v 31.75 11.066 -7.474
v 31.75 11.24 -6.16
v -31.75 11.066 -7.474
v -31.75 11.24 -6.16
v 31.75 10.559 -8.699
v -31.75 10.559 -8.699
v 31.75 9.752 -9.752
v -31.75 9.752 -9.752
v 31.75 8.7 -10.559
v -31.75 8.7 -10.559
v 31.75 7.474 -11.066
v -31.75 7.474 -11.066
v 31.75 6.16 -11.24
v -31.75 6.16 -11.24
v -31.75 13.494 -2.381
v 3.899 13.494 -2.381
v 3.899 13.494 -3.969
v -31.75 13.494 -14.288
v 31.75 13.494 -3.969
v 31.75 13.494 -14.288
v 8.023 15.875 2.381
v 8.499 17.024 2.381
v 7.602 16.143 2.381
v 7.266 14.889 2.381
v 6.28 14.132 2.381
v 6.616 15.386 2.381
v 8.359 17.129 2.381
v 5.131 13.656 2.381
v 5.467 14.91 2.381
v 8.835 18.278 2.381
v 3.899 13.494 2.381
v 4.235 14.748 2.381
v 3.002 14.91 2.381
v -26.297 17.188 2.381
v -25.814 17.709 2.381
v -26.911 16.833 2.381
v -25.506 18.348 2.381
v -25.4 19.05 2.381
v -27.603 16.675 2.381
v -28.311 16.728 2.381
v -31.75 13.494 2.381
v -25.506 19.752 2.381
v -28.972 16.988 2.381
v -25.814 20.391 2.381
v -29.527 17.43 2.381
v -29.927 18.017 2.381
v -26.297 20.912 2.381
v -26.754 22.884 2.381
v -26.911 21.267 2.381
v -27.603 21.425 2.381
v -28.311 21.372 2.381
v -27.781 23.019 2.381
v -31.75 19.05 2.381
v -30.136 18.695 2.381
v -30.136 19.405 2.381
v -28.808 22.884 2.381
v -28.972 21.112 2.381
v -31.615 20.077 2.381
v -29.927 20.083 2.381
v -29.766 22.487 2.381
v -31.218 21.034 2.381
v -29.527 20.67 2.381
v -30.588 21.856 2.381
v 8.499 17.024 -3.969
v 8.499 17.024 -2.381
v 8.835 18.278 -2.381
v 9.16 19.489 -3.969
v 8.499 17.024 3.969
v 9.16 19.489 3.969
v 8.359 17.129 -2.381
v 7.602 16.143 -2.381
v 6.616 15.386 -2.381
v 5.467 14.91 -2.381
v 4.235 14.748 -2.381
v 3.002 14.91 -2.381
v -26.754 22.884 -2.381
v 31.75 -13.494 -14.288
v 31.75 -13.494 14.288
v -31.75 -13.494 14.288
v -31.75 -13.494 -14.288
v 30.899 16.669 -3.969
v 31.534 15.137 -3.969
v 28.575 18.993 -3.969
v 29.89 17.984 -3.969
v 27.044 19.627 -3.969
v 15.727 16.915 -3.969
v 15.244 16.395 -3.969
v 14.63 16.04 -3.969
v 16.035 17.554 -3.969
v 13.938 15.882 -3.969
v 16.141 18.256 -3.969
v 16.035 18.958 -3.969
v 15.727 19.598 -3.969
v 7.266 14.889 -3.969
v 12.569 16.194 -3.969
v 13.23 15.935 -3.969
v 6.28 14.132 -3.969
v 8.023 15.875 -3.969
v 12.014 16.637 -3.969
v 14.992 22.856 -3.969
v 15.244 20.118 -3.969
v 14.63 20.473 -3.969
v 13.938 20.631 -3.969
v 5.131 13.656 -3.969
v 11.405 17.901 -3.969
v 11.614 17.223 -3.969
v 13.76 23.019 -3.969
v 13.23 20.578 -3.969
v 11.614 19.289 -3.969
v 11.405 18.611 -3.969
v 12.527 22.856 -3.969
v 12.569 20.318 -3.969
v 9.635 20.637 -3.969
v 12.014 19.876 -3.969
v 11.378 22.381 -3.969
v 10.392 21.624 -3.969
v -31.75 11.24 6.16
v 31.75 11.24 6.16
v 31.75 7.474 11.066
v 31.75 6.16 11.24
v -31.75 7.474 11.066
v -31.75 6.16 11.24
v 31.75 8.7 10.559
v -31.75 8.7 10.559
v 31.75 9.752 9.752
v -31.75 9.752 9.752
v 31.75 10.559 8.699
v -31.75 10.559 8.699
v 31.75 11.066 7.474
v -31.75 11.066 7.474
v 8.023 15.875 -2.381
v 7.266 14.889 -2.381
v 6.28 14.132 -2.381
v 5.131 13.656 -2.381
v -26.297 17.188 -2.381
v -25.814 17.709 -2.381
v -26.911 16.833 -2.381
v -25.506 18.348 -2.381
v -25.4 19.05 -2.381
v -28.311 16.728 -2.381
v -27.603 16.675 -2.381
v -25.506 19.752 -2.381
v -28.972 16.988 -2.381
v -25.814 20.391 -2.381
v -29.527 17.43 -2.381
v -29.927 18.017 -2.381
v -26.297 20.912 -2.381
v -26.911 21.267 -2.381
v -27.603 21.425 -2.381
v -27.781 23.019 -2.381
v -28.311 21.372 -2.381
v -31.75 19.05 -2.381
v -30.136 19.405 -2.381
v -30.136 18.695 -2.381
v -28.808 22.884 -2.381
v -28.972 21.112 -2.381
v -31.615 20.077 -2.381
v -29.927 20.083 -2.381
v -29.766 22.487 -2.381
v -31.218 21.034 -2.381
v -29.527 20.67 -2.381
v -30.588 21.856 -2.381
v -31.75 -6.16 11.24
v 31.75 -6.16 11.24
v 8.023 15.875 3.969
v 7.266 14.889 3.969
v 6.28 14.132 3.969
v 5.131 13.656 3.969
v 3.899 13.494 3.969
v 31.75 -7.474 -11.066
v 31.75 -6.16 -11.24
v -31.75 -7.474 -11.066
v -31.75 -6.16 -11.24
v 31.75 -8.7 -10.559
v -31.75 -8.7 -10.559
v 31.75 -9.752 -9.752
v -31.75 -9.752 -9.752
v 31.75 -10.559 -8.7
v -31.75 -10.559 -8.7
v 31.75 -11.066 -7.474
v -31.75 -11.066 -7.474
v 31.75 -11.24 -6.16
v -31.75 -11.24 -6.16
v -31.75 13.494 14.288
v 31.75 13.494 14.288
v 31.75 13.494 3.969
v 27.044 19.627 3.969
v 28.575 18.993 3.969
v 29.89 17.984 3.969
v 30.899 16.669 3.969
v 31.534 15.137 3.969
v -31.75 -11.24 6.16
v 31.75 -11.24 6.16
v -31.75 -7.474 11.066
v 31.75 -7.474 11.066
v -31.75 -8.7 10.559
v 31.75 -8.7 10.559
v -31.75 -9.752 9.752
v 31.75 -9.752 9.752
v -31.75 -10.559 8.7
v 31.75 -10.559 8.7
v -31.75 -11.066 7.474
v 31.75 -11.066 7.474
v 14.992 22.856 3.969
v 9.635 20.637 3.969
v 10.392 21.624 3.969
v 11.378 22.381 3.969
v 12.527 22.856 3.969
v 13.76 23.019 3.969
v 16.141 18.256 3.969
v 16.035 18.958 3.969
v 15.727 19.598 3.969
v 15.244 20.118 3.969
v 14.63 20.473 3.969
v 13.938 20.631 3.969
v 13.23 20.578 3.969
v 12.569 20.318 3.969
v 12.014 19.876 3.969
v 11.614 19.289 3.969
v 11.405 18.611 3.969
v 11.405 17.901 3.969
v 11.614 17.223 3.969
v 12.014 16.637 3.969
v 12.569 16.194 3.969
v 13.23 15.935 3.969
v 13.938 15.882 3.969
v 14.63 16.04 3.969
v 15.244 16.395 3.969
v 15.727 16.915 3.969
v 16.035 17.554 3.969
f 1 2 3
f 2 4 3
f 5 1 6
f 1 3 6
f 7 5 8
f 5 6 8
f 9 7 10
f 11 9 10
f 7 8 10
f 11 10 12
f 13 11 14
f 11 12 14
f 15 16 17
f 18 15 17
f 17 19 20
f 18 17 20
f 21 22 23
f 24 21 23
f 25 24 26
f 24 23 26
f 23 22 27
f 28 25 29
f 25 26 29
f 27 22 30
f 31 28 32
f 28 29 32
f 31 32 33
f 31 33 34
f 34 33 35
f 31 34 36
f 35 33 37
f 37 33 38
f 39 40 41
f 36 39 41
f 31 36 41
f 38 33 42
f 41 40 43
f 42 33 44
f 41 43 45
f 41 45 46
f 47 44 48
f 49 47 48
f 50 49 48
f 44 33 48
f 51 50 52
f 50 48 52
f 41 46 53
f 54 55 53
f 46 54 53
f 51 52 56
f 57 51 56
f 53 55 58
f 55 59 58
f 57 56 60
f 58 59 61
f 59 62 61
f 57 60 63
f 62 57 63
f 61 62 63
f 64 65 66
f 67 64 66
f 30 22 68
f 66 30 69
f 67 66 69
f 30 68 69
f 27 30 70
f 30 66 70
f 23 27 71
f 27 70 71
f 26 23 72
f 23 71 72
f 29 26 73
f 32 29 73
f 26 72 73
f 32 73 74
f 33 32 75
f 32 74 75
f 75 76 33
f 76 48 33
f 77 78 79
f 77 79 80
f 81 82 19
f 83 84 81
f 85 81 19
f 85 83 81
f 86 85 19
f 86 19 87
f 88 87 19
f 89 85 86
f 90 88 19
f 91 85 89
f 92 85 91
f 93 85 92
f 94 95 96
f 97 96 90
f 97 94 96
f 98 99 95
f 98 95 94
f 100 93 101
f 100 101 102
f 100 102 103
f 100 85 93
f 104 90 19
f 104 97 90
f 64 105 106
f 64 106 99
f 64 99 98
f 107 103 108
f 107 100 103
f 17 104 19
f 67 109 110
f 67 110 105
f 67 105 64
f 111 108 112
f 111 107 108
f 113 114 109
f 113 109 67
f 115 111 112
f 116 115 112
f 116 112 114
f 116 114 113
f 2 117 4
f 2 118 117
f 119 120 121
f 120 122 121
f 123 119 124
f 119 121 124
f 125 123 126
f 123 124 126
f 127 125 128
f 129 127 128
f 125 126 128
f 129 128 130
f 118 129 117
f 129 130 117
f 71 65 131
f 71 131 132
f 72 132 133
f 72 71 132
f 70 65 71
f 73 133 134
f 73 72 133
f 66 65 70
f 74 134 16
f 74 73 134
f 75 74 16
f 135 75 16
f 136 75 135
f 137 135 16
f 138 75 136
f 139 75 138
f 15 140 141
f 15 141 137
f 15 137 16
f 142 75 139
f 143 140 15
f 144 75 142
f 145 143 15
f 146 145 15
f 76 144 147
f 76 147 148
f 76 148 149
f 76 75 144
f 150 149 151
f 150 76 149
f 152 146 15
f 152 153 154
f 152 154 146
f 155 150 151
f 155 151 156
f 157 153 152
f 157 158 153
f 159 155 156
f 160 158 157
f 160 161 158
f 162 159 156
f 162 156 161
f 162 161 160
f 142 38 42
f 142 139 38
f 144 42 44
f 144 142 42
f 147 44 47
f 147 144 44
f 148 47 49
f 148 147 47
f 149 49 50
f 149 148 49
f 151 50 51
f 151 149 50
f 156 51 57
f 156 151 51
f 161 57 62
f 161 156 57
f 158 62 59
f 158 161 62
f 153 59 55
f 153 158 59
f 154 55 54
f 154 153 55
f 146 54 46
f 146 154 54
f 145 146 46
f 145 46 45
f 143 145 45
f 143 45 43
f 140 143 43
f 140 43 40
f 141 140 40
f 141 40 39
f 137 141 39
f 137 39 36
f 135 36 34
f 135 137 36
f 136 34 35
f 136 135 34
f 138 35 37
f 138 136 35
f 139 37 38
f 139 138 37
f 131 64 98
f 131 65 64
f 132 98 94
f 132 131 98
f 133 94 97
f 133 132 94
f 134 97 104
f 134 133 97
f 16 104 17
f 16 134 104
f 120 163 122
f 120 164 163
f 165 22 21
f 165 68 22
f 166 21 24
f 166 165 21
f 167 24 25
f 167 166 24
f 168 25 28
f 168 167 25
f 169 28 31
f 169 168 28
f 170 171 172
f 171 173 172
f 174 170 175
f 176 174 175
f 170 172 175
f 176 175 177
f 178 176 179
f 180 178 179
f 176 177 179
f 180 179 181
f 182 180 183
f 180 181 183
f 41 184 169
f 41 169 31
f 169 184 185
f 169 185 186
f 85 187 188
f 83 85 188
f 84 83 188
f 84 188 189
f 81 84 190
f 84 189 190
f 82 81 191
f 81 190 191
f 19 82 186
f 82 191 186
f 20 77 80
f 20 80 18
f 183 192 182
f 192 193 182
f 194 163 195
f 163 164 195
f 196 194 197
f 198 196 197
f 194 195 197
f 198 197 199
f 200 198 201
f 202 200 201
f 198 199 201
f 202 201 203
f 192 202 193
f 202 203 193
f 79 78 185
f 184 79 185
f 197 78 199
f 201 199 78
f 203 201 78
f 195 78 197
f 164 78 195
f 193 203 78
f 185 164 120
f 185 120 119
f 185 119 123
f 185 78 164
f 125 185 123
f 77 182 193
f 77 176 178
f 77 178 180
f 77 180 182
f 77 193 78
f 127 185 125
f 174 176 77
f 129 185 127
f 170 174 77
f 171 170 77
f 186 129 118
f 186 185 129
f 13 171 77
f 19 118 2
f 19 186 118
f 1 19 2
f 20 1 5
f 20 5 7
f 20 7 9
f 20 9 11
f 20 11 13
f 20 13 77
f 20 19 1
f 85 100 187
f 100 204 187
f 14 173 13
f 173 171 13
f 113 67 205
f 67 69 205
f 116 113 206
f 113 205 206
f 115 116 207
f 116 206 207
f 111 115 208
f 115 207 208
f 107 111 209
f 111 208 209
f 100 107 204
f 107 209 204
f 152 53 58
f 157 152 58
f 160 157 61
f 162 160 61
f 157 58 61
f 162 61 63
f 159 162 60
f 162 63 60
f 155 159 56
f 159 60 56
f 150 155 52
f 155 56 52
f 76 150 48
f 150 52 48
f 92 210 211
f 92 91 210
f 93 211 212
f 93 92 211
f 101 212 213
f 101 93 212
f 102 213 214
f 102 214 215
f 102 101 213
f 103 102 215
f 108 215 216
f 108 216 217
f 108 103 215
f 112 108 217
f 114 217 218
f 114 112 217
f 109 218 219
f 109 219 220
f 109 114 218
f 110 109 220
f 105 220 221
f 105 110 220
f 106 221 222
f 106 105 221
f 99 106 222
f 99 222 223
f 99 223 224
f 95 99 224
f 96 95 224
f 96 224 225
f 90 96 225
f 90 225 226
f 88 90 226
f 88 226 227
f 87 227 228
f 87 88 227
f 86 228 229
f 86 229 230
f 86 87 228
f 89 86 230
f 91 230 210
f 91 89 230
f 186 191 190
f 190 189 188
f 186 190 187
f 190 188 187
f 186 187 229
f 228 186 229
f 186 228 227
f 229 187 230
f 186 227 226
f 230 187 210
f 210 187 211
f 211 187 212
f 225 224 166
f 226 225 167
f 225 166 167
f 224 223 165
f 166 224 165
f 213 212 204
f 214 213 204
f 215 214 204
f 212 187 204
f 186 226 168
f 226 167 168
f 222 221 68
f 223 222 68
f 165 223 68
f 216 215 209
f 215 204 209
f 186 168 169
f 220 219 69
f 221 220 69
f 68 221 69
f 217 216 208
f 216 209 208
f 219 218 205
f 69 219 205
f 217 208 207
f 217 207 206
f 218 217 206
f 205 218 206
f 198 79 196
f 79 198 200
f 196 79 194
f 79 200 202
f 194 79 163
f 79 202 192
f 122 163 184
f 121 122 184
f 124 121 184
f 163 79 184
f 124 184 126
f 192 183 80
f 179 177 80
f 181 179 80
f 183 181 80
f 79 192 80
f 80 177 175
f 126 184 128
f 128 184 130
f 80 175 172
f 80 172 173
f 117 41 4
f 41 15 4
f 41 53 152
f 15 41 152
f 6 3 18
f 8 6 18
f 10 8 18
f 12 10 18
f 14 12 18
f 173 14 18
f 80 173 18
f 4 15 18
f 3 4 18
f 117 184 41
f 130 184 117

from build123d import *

# Parameters (mm, degrees)
SKETCH1_W           = 28.575
SKETCH1_H           = 26.9875
SKETCH1_W_2         = 22.479
SKETCH1_H_2         = 22.479
BOSS_EXTRUDE1_DEPTH = 31.75
FILLET1_R           = 5.08
SKETCH2_R           = 2.38125
BOSS_EXTRUDE2_DEPTH = 3.96875
SKETCH3_R           = 2.38125
BOSS_EXTRUDE3_DEPTH = 2.38125
FILLET2_R           = 4.7625
FILLET3_R           = 4.7625


with BuildPart() as part:
    # Sketch1 → Boss-Extrude1 (new body, symmetric)
    with BuildSketch(Plane(origin=(0, 0, 0), x_dir=(0, 0, -1), z_dir=(1, 0, 0))):
        Rectangle(SKETCH1_W, SKETCH1_H)
        Rectangle(SKETCH1_W_2, SKETCH1_H_2, mode=Mode.SUBTRACT)
    extrude(amount=BOSS_EXTRUDE1_DEPTH, both=True)

    # Fillet1
    fillet1_edges = [part.edges().sort_by_distance(p)[0] for p in [
        (0, -11.2395, -11.2395),
        (0, 11.2395, -11.2395),
        (0, 11.2395, 11.2395),
        (0, -11.2395, 11.2395),
    ]]
    fillet(fillet1_edges, radius=FILLET1_R)

    # Sketch2 → Boss-Extrude2 (add, symmetric)
    with BuildSketch(Plane.XY):
        with BuildLine():
            Line((7.553126188, 13.49375), (9.159515278, 19.488875702))
            ThreePointArc((9.159515278, 19.488875702), (11.378487026, 22.380695986), (14.992362728, 22.856471748))
            Line((14.992362728, 22.856471748), (27.043500936, 19.627378997))
            ThreePointArc((27.043500936, 19.627378997), (30.437793711, 17.359385074), (31.75, 13.49375))
            Line((31.75, 13.49375), (7.553126188, 13.49375))
        make_face()
        with Locations((13.759737026, 18.25625)):
            Circle(SKETCH2_R, mode=Mode.SUBTRACT)
    extrude(amount=BOSS_EXTRUDE2_DEPTH, both=True)

    # Sketch3 → Boss-Extrude3 (add, symmetric)
    with BuildSketch(Plane.XY):
        with BuildLine():
            ThreePointArc((-31.75, 19.05), (-30.197271921, 22.198621069), (-26.754061915, 22.883518123))
            Line((-26.754061915, 22.883518123), (7.602422382, 13.677725901))
            Line((7.602422382, 13.677725901), (7.553126188, 13.49375))
            Line((7.553126188, 13.49375), (-31.75, 13.49375))
            Line((-31.75, 13.49375), (-31.75, 19.05))
        make_face()
        with Locations((-27.78125, 19.05)):
            Circle(SKETCH3_R, mode=Mode.SUBTRACT)
    extrude(amount=BOSS_EXTRUDE3_DEPTH, both=True)

    # Fillet2
    fillet2_edges = [part.edges().sort_by_distance(p)[0] for p in [
        (7.602422382, 13.677725901, 0),
    ]]
    fillet(fillet2_edges, radius=FILLET2_R)

    # Fillet3
    fillet3_edges = [part.edges().sort_by_distance(p)[0] for p in [
        (7.553126188, 13.49375, 3.175),
        (7.553126188, 13.49375, -3.175),
    ]]
    fillet(fillet3_edges, radius=FILLET3_R)


solid = part.part
